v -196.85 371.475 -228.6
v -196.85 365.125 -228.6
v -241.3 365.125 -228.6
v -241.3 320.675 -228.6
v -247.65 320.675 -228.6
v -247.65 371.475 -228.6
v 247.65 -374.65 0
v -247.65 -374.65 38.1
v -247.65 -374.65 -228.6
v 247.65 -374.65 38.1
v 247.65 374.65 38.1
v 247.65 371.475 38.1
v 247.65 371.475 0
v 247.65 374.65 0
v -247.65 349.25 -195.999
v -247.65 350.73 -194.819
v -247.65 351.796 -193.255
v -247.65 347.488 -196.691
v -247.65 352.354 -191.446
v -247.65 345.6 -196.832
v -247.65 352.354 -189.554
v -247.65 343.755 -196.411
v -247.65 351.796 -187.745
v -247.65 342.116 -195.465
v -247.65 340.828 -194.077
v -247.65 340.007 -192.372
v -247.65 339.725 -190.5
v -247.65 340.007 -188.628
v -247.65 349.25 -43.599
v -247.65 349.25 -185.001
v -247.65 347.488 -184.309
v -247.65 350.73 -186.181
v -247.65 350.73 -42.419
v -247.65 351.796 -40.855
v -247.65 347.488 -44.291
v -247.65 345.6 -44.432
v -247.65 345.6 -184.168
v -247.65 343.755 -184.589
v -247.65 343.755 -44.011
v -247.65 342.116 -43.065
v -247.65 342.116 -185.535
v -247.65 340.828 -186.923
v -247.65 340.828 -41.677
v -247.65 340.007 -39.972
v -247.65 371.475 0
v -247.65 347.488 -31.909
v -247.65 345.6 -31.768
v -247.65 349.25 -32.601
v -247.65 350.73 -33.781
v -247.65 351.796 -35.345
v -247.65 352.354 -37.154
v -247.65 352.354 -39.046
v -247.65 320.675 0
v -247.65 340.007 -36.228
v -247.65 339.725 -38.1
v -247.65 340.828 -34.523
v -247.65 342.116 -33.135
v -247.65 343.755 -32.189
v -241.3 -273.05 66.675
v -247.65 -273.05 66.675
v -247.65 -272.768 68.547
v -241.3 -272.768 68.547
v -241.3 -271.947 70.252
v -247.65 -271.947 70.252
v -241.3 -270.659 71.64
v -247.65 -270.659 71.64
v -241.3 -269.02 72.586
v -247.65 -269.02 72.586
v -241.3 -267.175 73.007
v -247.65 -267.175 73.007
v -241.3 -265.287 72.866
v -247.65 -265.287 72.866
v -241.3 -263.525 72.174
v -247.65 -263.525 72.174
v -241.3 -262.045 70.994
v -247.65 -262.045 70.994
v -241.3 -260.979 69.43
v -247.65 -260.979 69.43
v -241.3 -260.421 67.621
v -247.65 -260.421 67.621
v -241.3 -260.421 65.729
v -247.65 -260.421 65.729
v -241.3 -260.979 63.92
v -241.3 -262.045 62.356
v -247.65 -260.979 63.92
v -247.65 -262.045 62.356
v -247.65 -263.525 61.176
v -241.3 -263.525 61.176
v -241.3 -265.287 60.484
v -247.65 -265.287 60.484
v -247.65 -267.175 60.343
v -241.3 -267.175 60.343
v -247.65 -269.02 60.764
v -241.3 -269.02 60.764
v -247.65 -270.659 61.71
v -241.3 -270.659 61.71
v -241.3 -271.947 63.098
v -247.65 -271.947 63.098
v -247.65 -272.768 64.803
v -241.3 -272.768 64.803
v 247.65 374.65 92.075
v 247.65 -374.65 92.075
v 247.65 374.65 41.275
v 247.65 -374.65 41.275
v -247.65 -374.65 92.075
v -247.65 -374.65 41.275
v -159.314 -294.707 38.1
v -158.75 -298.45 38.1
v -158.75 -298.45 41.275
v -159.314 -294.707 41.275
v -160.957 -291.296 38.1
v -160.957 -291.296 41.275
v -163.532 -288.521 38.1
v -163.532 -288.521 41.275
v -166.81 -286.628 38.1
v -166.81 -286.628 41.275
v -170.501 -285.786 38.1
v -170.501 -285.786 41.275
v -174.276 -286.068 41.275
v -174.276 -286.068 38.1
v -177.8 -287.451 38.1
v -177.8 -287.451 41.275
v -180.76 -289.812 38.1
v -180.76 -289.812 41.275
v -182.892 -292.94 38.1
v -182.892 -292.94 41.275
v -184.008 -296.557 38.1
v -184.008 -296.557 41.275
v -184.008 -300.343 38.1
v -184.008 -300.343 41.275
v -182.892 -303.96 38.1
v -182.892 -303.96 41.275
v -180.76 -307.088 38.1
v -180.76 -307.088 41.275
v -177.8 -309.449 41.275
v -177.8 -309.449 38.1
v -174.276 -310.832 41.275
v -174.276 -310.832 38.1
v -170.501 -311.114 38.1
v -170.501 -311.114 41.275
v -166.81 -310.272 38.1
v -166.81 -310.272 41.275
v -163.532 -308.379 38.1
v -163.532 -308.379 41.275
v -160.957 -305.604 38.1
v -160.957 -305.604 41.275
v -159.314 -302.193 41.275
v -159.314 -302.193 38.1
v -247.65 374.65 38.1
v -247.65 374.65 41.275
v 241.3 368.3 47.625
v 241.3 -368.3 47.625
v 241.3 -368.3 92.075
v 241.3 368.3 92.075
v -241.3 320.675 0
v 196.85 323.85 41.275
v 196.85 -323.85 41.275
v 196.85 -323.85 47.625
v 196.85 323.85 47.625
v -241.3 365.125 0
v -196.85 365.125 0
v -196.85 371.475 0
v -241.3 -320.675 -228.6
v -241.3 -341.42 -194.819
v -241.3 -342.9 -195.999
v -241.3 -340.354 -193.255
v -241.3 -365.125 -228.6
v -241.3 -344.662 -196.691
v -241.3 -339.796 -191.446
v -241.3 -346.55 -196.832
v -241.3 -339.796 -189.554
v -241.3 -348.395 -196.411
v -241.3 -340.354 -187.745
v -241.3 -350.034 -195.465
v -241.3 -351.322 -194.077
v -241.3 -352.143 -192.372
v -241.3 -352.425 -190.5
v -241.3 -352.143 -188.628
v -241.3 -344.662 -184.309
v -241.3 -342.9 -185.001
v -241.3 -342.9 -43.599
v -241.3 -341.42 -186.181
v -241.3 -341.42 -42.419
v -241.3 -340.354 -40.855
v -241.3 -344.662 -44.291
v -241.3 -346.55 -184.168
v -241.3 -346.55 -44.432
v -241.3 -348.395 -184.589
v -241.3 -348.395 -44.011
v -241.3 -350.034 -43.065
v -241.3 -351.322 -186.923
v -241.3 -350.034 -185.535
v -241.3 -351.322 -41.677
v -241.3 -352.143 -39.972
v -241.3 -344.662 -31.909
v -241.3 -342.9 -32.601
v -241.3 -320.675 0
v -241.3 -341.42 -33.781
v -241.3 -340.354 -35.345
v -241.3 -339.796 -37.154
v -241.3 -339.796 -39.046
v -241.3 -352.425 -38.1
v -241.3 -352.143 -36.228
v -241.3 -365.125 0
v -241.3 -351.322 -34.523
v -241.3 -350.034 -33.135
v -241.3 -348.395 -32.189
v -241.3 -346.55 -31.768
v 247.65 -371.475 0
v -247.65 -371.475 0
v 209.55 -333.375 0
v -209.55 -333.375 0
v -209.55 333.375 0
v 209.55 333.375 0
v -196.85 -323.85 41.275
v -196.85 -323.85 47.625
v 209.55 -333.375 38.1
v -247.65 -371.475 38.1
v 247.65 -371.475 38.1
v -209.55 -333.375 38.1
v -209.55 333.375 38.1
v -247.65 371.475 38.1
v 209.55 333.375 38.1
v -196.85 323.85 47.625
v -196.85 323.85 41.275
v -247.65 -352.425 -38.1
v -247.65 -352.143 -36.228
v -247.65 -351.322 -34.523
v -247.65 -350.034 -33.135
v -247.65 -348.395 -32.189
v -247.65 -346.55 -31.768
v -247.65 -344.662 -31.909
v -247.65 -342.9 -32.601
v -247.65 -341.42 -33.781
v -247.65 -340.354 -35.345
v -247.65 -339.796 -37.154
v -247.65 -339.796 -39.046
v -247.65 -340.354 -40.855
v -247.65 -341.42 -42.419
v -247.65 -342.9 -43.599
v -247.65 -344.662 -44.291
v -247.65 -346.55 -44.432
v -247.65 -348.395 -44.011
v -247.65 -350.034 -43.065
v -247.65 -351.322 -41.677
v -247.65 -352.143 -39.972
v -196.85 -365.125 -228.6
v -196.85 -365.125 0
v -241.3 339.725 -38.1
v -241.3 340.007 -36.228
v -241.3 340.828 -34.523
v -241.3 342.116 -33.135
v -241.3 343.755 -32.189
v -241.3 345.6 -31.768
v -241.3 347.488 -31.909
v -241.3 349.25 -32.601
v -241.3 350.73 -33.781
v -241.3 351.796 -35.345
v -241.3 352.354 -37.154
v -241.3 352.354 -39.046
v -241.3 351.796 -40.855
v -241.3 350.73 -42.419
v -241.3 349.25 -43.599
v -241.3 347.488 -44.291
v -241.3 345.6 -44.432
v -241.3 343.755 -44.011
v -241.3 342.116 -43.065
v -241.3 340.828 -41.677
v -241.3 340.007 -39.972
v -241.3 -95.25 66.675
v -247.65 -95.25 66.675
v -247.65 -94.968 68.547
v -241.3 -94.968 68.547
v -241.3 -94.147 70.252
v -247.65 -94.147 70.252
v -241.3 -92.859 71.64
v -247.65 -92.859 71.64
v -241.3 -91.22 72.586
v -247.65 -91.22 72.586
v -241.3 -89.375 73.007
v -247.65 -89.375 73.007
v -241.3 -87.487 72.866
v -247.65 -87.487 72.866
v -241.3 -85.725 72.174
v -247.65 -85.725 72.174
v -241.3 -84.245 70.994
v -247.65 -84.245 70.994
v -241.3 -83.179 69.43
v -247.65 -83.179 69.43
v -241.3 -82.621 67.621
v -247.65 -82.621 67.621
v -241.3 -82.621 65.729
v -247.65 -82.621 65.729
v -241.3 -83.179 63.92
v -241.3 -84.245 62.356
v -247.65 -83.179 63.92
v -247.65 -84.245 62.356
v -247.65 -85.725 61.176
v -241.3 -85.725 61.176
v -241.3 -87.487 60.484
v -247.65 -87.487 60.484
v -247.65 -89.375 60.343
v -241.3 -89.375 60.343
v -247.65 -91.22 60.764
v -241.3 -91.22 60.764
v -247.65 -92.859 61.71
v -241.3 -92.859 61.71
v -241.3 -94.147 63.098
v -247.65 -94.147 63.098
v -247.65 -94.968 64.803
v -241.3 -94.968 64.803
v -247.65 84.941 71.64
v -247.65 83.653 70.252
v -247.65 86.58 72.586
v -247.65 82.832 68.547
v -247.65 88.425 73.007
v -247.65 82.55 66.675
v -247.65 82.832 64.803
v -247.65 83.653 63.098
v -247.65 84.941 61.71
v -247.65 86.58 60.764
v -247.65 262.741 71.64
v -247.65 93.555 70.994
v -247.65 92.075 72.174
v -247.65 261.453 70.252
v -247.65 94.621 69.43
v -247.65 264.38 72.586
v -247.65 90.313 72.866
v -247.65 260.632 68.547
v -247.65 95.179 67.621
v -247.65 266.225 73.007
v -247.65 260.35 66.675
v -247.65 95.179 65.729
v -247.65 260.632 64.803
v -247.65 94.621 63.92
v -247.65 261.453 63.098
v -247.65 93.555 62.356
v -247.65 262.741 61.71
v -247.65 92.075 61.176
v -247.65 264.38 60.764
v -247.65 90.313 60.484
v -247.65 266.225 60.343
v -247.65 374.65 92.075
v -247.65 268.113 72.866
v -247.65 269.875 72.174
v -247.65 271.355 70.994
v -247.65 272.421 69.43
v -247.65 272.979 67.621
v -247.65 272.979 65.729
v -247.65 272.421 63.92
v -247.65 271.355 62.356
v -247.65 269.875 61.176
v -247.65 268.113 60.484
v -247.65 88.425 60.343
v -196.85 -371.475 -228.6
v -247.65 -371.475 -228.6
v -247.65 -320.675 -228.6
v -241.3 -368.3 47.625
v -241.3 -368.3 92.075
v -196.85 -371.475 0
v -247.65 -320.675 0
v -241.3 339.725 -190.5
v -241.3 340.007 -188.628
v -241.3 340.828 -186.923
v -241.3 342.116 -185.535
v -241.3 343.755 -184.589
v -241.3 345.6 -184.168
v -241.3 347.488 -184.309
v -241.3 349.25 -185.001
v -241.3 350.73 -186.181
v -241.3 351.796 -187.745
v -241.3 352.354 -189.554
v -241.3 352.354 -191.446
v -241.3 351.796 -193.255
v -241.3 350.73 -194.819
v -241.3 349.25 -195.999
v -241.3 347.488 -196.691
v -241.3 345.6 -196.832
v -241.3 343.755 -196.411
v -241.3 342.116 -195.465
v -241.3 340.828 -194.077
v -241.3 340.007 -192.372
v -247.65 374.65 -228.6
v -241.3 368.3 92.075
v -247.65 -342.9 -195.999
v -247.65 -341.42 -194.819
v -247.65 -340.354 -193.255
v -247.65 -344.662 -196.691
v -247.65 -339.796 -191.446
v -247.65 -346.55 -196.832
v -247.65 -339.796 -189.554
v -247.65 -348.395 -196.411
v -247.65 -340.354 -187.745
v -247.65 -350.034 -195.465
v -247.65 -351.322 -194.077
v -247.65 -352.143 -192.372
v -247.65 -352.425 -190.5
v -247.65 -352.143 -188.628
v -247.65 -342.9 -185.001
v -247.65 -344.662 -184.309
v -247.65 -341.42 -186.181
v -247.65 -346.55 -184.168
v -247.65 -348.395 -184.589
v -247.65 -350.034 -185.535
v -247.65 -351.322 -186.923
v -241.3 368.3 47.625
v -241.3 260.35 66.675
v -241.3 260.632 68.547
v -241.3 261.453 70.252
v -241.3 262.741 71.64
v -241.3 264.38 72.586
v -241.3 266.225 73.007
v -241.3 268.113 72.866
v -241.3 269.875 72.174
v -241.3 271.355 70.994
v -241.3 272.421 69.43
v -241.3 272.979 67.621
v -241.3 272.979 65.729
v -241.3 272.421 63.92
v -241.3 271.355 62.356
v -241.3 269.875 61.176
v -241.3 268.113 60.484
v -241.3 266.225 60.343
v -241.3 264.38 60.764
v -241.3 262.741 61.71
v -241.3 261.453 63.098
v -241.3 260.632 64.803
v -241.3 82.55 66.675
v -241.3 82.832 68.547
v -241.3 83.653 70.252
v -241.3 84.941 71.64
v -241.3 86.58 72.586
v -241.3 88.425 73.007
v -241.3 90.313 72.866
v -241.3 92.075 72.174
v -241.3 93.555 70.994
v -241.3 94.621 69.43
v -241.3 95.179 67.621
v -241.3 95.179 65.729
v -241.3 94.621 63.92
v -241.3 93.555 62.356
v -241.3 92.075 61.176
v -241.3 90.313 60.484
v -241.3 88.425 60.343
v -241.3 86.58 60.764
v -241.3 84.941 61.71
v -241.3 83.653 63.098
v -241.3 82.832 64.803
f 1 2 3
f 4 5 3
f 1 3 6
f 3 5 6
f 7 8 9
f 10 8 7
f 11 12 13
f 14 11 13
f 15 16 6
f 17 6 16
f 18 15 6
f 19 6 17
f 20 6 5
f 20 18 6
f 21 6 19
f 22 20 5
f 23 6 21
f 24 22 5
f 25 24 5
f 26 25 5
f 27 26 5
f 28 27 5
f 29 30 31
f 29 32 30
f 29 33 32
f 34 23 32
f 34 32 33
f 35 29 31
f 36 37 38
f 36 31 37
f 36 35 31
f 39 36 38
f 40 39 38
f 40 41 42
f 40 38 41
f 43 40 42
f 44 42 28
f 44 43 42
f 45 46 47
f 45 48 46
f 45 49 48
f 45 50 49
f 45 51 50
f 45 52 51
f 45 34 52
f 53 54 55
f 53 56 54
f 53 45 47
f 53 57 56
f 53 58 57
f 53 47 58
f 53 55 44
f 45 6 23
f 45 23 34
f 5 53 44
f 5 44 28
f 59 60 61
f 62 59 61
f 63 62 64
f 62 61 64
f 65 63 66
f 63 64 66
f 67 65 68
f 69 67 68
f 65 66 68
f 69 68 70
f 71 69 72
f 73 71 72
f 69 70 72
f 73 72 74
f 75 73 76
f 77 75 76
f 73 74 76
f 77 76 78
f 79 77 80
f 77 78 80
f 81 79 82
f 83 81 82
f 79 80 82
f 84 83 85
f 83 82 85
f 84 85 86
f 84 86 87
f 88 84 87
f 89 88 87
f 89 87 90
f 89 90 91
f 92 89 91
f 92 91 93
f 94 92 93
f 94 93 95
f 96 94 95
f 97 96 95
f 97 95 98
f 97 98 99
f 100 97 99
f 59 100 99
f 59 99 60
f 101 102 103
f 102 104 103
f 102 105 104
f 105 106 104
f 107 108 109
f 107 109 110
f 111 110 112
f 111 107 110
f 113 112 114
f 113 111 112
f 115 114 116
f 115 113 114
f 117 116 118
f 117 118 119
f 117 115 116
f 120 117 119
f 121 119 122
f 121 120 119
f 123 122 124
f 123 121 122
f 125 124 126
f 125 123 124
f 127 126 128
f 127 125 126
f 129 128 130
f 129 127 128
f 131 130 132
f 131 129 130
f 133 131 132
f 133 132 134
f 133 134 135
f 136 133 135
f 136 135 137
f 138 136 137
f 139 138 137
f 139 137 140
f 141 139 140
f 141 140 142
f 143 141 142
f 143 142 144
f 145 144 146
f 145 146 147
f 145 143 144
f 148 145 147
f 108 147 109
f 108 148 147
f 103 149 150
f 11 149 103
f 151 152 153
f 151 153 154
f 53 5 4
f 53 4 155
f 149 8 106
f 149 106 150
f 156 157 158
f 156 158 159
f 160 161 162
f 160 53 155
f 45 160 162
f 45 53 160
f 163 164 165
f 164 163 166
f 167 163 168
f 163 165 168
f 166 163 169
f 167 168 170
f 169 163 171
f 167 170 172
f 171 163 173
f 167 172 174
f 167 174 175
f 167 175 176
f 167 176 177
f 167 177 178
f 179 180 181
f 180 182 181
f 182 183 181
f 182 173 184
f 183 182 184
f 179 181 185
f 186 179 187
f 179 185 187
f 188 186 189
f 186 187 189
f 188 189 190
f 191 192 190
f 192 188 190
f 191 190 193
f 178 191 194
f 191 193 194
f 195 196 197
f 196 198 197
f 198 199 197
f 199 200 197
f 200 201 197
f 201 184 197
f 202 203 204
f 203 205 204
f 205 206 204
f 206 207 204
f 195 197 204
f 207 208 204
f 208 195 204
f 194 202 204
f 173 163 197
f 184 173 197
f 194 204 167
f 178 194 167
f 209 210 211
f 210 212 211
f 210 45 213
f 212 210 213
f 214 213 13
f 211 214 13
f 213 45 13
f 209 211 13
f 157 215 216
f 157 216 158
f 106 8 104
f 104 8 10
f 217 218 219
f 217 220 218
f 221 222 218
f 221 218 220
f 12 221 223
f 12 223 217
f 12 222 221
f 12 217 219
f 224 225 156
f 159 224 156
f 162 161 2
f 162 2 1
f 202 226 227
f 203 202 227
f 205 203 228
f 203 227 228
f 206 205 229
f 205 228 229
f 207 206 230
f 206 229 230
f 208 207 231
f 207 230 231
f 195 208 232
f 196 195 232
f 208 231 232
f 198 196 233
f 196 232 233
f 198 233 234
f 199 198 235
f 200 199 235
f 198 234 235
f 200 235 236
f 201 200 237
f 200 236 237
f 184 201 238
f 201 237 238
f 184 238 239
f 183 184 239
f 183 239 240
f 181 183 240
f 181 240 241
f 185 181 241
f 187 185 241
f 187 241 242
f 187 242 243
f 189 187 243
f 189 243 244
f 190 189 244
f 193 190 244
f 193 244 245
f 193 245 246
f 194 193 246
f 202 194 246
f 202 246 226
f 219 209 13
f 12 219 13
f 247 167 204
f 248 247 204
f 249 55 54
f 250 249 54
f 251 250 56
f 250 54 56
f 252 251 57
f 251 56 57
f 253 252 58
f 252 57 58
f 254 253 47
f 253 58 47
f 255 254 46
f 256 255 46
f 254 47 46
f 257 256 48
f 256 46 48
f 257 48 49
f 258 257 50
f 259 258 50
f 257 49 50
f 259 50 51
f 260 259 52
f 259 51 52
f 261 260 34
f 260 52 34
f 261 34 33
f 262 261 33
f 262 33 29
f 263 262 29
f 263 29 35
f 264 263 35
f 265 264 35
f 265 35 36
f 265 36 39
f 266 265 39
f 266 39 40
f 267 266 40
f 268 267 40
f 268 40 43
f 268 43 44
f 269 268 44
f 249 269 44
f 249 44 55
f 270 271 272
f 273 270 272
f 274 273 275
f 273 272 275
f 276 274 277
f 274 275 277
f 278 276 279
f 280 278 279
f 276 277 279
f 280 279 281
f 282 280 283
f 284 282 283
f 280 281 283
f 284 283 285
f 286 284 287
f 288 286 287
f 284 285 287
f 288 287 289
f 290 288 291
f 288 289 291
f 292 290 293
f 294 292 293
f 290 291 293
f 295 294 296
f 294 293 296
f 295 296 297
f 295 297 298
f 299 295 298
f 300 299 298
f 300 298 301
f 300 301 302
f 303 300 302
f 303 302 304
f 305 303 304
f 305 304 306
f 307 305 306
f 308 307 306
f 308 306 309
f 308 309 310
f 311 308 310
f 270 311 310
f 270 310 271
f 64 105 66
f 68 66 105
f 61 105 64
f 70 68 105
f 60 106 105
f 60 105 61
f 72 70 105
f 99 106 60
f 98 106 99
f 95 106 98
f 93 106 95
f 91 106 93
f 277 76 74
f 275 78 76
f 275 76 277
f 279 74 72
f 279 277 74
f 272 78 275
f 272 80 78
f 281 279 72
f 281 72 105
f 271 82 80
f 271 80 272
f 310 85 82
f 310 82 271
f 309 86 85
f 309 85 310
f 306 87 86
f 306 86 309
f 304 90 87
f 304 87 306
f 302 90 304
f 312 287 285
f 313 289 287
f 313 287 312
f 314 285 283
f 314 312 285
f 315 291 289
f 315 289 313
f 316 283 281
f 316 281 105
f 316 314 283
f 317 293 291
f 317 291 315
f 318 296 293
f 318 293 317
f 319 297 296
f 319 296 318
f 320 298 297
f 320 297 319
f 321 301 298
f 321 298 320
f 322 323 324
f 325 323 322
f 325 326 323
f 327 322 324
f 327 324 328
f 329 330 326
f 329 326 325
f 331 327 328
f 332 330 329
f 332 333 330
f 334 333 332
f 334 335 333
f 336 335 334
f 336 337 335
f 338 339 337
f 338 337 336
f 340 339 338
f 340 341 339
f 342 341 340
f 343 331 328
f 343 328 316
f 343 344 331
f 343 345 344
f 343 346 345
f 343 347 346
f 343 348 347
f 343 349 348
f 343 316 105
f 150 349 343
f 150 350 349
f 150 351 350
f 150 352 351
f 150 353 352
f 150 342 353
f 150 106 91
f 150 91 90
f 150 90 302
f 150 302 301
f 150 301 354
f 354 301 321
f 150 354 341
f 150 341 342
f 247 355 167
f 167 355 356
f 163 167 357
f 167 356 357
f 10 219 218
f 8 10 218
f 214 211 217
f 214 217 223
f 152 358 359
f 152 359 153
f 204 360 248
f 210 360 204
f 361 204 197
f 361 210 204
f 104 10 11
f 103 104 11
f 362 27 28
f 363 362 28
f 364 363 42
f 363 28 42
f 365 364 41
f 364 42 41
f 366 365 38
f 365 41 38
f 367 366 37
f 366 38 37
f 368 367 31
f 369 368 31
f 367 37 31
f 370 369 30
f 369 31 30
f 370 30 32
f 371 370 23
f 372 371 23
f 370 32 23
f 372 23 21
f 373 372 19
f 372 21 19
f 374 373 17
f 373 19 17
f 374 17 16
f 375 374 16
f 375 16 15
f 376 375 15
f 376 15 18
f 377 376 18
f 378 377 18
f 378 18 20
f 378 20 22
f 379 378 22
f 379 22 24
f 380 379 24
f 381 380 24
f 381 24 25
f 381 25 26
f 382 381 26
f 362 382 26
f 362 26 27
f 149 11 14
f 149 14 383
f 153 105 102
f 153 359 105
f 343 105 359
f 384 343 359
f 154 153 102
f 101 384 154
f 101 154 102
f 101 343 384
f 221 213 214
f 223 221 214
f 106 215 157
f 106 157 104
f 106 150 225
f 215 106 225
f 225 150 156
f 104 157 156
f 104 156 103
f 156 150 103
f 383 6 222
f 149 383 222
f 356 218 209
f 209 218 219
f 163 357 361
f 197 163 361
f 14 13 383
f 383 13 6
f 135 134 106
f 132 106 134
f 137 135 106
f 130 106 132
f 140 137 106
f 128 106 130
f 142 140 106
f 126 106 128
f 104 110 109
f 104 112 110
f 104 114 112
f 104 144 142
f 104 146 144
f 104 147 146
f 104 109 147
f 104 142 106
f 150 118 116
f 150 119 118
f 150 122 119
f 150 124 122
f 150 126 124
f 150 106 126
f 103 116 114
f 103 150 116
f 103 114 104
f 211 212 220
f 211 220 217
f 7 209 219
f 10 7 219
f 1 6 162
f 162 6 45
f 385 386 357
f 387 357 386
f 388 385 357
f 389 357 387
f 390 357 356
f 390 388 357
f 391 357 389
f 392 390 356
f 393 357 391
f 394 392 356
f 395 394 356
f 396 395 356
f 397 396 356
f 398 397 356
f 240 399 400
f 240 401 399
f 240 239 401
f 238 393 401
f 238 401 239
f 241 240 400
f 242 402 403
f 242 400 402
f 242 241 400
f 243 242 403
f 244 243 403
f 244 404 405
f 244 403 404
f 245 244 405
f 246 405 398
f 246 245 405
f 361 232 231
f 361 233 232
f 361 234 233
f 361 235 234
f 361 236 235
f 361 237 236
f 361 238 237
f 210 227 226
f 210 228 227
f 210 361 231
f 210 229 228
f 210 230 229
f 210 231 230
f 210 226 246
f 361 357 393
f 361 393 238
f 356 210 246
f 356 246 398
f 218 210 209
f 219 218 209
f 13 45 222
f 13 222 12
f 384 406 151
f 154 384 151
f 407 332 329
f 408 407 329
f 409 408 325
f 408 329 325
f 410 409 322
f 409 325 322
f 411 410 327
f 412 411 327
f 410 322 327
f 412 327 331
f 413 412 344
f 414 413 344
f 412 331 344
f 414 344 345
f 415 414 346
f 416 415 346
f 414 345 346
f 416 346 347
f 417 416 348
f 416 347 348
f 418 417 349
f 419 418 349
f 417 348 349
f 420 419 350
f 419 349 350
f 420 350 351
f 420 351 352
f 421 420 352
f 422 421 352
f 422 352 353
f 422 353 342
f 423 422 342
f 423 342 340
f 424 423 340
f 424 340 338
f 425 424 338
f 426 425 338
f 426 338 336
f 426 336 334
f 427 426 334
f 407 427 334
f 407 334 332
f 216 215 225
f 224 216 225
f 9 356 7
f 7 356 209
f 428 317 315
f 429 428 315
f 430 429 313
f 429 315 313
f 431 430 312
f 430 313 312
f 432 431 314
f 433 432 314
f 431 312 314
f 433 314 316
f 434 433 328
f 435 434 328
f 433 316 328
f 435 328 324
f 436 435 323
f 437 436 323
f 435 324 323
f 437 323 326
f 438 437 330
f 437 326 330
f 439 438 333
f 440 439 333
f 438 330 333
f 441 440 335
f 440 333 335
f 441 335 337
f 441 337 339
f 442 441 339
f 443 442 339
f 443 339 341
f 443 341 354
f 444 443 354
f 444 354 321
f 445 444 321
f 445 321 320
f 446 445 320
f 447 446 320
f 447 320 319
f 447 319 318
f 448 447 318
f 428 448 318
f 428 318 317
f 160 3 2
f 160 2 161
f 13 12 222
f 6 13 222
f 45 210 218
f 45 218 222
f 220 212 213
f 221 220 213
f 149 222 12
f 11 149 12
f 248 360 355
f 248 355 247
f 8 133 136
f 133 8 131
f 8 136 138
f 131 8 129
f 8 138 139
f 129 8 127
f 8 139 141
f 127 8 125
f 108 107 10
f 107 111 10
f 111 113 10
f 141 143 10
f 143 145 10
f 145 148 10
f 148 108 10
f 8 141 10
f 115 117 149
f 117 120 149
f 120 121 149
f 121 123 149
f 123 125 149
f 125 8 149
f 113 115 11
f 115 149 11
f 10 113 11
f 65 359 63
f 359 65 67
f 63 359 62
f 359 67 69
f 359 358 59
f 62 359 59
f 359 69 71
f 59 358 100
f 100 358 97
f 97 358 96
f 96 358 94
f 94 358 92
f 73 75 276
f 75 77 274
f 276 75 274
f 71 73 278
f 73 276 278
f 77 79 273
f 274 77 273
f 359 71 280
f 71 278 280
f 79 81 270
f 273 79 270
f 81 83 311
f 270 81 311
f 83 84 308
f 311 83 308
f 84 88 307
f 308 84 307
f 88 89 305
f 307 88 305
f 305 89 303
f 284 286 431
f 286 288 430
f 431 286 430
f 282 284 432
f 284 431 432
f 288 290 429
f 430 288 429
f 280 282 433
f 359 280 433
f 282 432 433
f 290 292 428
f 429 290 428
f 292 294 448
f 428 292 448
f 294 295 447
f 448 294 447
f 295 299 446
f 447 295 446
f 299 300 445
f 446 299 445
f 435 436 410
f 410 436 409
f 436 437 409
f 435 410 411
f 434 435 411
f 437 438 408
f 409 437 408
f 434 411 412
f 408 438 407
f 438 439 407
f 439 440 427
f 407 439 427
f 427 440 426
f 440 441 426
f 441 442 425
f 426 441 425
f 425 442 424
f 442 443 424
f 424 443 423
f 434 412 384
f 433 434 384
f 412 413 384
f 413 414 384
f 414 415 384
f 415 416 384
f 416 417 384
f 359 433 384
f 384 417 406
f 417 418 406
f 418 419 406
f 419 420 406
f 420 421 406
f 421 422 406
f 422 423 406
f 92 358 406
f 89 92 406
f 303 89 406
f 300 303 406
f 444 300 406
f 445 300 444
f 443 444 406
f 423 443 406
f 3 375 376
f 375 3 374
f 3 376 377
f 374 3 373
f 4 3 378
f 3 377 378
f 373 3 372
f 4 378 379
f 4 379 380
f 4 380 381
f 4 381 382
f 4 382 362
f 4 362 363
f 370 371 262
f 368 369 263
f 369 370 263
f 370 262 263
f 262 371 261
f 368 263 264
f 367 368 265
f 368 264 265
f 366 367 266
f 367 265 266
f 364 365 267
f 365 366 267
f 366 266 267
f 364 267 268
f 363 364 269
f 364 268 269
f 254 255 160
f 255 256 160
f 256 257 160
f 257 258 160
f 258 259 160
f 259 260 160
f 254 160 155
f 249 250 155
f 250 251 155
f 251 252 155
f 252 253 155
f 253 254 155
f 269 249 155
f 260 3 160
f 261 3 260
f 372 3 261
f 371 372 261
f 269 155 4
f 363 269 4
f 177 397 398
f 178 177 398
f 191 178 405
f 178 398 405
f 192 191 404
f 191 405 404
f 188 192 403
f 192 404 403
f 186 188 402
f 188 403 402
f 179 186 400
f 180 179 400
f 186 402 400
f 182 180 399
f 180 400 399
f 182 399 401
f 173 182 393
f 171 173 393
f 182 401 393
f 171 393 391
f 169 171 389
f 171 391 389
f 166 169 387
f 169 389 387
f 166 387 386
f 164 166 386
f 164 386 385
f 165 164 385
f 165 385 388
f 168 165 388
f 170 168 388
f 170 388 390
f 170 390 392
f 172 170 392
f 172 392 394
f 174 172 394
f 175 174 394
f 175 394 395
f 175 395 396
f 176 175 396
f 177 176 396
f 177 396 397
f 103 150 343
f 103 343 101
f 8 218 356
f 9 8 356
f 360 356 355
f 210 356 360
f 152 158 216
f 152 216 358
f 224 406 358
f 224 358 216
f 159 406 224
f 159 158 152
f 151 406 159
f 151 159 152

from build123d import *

# Parameters (mm, degrees)
F0_W      = 495.3
F0_H      = 742.95
F0_W_2    = 419.1
F0_H_2    = 666.75
F1_DEPTH  = 38.1
F4_DEPTH  = 3.175
F5_DEPTH  = 3.175
F6_W      = 50.8
F6_H      = 228.6
F7_DEPTH  = 6.35
F8_W      = 6.35
F8_H      = 228.6
F9_DEPTH  = 44.45
F10_W     = 6.35
F10_H     = 228.6
F11_DEPTH = 44.45
F12_W     = 495.3
F12_H     = 749.3
F12_R     = 12.7
F13_DEPTH = 3.175
F14_W     = 495.3
F14_H     = 749.3
F14_W_2   = 393.7
F14_H_2   = 647.7
F15_DEPTH = 6.35
F16_W     = 495.3
F16_H     = 749.3
F16_W_2   = 482.5999817848
F16_H_2   = 736.5999817848
F17_DEPTH = 44.45
F18_R     = 6.35
F19_DEPTH = 25.4


with BuildPart() as f1:
    # F0 (on Top) → F1 (new body)
    with BuildSketch(Plane.XY):
        Rectangle(F0_W, F0_H)
        Rectangle(F0_W_2, F0_H_2, mode=Mode.SUBTRACT)
    extrude(amount=F1_DEPTH)


with BuildPart() as f4:
    # F2 (on face) → F4 (new body)
    with BuildSketch(Plane.XZ.offset(371.475)):
        Polygon((247.65, 0), (247.65, 38.1), (-247.65, 38.1), (-247.65, 0), (-247.65, -228.6), align=None)
    extrude(amount=F4_DEPTH)


with BuildPart() as f5:
    # F3 (on face) → F5 (new body)
    with BuildSketch(Plane(origin=(0, 371.475, 0), x_dir=(-1, 0, 0), z_dir=(0, 1, 0))):
        Polygon((-247.65, 38.1), (-247.65, 0), (247.65, -228.6), (247.65, 0), (247.65, 38.1), align=None)
    extrude(amount=F5_DEPTH)


with BuildPart() as f7:
    # F6 (on face) → F7 (new body)
    with BuildSketch(Plane(origin=(-247.65, 0, 0), x_dir=(0, -1, 0), z_dir=(-1, 0, 0))):
        with Locations((346.075, -114.3)):
            Rectangle(F6_W, F6_H)
    extrude(amount=-F7_DEPTH)

    # F8 (on face) → F9 (join)
    with BuildSketch(Plane.YZ.offset(-241.3)):
        with Locations((-368.3, -114.3)):
            Rectangle(F8_W, F8_H)
    extrude(amount=F9_DEPTH)


with BuildPart() as f7b:
    # F6 (on face) → F7, piece 2 (new body)
    with BuildSketch(Plane(origin=(-247.65, 0, 0), x_dir=(0, -1, 0), z_dir=(-1, 0, 0))):
        with Locations((-346.075, -114.3)):
            Rectangle(F6_W, F6_H)
    extrude(amount=-F7_DEPTH)

    # F10 (on face) → F11 (join)
    with BuildSketch(Plane.YZ.offset(-241.3)):
        with Locations((368.3, -114.3)):
            Rectangle(F10_W, F10_H)
    extrude(amount=F11_DEPTH)


with BuildPart() as f13:
    # F12 (on face) → F13 (new body)
    with BuildSketch(Plane.XY.offset(38.1)):
        Rectangle(F12_W, F12_H)
        with Locations((-171.45, -298.45)):
            Circle(F12_R, mode=Mode.SUBTRACT)
    extrude(amount=F13_DEPTH)


with BuildPart() as f15:
    # F14 (on face) → F15 (new body)
    with BuildSketch(Plane.XY.offset(41.275)):
        Rectangle(F14_W, F14_H)
        Rectangle(F14_W_2, F14_H_2, mode=Mode.SUBTRACT)
    extrude(amount=F15_DEPTH)

    # F16 (on face) → F17 (join)
    with BuildSketch(Plane.XY.offset(47.625)):
        Rectangle(F16_W, F16_H)
        Rectangle(F16_W_2, F16_H_2, mode=Mode.SUBTRACT)
    extrude(amount=F17_DEPTH)


with BuildPart() as f19_tool:
    # F18 (on face) → F19 (new body)
    with BuildSketch(Plane(origin=(-247.65, 0, 0), x_dir=(0, -1, 0), z_dir=(-1, 0, 0))):
        with Locations((-266.7, 66.675)):
            Circle(F18_R)
        with Locations((-88.9, 66.675)):
            Circle(F18_R)
        with Locations((88.9, 66.675)):
            Circle(F18_R)
        with Locations((266.7, 66.675)):
            Circle(F18_R)
        with Locations((-346.075, -38.1)):
            Circle(F18_R)
        with Locations((-346.075, -190.5)):
            Circle(F18_R)
        with Locations((346.075, -38.1)):
            Circle(F18_R)
        with Locations((346.075, -190.5)):
            Circle(F18_R)
    extrude(amount=-F19_DEPTH)


with BuildPart() as f7_1:
    add(f7.part)

    # F19: cut by f19_tool
    add(f19_tool.part, mode=Mode.SUBTRACT)


with BuildPart() as f7b_1:
    add(f7b.part)

    # F19: cut by f19_tool
    add(f19_tool.part, mode=Mode.SUBTRACT)


with BuildPart() as f15_1:
    add(f15.part)

    # F19: cut by f19_tool
    add(f19_tool.part, mode=Mode.SUBTRACT)


solid = Compound([f1.part, f4.part, f5.part, f13.part, f7_1.part, f7b_1.part, f15_1.part])
